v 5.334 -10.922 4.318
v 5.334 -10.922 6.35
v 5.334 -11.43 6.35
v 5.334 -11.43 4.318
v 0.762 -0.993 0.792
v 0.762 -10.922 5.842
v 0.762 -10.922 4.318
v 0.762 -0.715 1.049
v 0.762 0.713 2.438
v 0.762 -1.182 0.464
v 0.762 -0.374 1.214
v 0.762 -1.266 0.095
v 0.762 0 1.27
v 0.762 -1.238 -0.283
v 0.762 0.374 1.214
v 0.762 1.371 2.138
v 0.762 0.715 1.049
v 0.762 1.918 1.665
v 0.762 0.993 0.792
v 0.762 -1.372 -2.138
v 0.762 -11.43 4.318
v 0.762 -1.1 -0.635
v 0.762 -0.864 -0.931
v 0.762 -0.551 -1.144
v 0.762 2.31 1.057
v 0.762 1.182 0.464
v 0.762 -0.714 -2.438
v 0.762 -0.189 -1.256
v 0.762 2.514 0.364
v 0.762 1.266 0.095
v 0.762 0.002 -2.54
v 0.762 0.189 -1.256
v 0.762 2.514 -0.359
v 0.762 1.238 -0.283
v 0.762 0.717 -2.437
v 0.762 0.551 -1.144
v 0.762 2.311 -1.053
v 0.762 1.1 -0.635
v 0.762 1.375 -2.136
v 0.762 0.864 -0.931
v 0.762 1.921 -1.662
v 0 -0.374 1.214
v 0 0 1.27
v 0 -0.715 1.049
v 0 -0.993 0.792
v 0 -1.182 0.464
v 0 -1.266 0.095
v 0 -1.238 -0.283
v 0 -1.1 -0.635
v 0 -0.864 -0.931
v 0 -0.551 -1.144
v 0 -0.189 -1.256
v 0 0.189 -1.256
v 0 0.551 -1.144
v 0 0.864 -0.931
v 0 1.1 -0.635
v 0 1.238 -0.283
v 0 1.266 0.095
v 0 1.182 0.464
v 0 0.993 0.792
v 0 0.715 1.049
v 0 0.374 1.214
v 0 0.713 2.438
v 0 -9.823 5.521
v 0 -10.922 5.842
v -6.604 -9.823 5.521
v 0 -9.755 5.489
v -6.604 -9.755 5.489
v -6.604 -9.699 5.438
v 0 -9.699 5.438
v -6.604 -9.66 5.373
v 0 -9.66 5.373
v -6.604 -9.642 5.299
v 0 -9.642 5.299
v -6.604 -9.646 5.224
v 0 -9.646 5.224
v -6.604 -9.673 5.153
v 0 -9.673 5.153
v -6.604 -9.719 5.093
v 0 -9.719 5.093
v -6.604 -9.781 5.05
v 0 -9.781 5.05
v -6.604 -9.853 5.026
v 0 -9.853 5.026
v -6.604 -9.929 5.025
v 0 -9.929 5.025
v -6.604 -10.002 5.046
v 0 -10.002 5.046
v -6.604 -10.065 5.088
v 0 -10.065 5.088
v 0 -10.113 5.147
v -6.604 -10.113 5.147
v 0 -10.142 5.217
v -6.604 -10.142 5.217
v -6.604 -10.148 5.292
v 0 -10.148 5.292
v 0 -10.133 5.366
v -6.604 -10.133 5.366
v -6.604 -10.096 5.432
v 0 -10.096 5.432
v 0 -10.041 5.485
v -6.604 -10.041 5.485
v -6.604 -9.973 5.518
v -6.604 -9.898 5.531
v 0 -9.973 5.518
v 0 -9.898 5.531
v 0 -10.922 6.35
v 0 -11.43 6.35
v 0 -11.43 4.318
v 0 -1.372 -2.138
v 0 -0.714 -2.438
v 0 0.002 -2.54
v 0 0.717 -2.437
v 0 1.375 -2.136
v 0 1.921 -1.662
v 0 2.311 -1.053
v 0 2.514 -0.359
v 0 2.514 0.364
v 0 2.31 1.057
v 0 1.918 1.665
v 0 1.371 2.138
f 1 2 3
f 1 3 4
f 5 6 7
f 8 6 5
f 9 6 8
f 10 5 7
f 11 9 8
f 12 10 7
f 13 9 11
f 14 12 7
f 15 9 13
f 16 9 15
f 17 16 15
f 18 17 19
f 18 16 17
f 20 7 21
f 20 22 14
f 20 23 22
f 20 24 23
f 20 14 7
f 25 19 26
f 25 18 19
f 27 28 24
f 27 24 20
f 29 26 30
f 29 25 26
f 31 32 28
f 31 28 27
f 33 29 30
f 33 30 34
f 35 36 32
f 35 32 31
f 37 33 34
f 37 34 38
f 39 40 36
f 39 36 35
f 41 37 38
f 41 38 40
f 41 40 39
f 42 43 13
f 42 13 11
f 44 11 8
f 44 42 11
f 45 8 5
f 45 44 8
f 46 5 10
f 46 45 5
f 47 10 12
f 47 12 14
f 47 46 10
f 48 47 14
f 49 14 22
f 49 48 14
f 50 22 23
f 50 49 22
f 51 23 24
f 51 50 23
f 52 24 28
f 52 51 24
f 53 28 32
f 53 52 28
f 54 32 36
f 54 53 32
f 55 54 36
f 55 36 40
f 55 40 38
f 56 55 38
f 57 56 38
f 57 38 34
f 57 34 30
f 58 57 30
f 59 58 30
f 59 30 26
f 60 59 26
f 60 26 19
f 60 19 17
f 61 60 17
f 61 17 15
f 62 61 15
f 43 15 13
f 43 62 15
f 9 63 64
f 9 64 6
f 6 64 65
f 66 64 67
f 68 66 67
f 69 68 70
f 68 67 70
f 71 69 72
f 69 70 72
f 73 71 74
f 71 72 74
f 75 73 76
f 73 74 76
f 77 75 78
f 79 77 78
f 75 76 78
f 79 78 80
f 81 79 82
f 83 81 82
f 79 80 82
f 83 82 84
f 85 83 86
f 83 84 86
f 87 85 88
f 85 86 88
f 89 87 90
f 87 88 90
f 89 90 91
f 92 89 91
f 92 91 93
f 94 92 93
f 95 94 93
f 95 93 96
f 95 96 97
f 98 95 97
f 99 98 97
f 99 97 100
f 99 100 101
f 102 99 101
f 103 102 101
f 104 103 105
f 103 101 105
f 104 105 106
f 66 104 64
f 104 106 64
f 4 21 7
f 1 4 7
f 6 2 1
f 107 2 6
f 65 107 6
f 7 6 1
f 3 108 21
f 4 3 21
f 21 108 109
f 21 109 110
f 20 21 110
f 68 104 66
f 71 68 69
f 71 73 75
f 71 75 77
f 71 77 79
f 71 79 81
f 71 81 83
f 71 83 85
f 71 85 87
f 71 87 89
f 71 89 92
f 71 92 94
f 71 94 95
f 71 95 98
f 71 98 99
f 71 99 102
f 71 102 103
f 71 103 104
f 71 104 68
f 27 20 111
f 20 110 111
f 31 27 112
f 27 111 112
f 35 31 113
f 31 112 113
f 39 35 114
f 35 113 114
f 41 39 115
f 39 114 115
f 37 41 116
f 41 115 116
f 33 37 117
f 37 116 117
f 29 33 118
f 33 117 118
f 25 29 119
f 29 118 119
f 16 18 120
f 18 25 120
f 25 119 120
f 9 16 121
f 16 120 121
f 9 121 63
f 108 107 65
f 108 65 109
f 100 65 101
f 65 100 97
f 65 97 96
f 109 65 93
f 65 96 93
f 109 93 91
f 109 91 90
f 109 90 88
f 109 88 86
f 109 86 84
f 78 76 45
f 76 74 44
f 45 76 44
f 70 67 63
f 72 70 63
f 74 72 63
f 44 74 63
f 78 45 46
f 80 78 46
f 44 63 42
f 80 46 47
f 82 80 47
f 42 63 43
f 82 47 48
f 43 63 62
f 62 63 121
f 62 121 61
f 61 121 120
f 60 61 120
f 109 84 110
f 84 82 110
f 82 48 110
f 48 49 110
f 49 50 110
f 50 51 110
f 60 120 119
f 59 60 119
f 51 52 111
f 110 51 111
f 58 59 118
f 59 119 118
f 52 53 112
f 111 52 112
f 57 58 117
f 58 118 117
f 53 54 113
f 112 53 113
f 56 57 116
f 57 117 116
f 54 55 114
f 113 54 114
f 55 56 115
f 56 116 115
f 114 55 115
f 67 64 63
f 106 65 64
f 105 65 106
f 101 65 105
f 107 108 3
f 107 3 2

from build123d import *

# Parameters (mm, degrees)
BOSS_EXTRUDE1_DEPTH = 5.334
SKETCH1_3_R         = 1.27
BOSS_EXTRUDE2_DEPTH = 0.762
SKETCH2_R           = 0.254
BOSS_EXTRUDE3_DEPTH = 6.604


with BuildPart() as part:
    # Sketch1 → Boss-Extrude1 (new body)
    with BuildSketch(Plane(origin=(0, 0, 0), x_dir=(0, 0, -1), z_dir=(1, 0, 0))):
        Polygon((-6.35, -11.43), (-4.318, -11.43), (-4.318, -10.922), (-5.842, -10.922), (-6.35, -10.922), align=None)
    extrude(amount=BOSS_EXTRUDE1_DEPTH)

    # Sketch1<3> → Boss-Extrude2 (add)
    with BuildSketch(Plane(origin=(0, 0, 0), x_dir=(0, 0, -1), z_dir=(1, 0, 0))):
        with BuildLine():
            Line((-4.318, -11.43), (2.137587014, -1.371977316))
            ThreePointArc((2.137587014, -1.371977316), (1.053360752, 2.311283437), (-2.437803052, 0.713243493))
            Line((-2.437803052, 0.713243493), (-5.842, -10.922))
            Line((-5.842, -10.922), (-4.318, -10.922))
            Line((-4.318, -10.922), (-4.318, -11.43))
        make_face()
        Circle(SKETCH1_3_R, mode=Mode.SUBTRACT)
    extrude(amount=BOSS_EXTRUDE2_DEPTH)

    # Sketch2 → Boss-Extrude3 (add)
    with BuildSketch(Plane.ZY):
        with Locations((5.27681031, -9.894775555)):
            Circle(SKETCH2_R)
    extrude(amount=BOSS_EXTRUDE3_DEPTH)


solid = part.part
